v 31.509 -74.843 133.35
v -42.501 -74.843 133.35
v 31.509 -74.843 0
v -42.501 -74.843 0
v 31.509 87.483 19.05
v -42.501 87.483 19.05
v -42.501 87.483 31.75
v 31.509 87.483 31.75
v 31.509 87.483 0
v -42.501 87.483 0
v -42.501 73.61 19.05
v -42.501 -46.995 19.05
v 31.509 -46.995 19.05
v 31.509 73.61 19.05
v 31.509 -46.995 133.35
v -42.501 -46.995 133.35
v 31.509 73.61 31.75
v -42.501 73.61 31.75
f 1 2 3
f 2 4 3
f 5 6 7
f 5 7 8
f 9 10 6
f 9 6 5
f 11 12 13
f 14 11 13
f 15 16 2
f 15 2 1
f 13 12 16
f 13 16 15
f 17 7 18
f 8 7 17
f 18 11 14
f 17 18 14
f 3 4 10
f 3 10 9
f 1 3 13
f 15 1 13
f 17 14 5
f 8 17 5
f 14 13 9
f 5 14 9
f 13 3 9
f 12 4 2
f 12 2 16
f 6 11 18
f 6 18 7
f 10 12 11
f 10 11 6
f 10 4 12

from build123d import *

# Parameters (mm, degrees)
F0_W     = 74.0097276866
F0_H     = 111.5253269672
F1_DEPTH = 19.05
F2_W     = 74.0097276866
F2_H     = 27.8478488326
F3_DEPTH = 114.3
F4_DEPTH = 50.8
F5_W     = 74.0097276866
F5_H     = 13.872501123
F6_DEPTH = 12.7


with BuildPart() as f1:
    # F0 (on Top) → F1 (new body)
    with BuildSketch(Plane.XY):
        with Locations((-5.4957885295, -19.080080092)):
            Rectangle(F0_W, F0_H)
    extrude(amount=F1_DEPTH)

    # F2 (on face) → F3 (join)
    with BuildSketch(Plane.XY.offset(19.05)):
        with Locations((-5.4957885295, -60.9188191593)):
            Rectangle(F2_W, F2_H)
    extrude(amount=F3_DEPTH)

    # F4 (add): a face of the model
    f4_faces = [f1.faces().sort_by_distance(p)[0] for p in [
        (-5.4957885295, 36.6825833917, 9.525),
    ]]
    extrude(f4_faces, amount=F4_DEPTH)

    # F5 (on face) → F6 (join)
    with BuildSketch(Plane.XY.offset(19.05)):
        with Locations((-5.4957885295, 80.5463328302)):
            Rectangle(F5_W, F5_H)
    extrude(amount=F6_DEPTH)


solid = f1.part
